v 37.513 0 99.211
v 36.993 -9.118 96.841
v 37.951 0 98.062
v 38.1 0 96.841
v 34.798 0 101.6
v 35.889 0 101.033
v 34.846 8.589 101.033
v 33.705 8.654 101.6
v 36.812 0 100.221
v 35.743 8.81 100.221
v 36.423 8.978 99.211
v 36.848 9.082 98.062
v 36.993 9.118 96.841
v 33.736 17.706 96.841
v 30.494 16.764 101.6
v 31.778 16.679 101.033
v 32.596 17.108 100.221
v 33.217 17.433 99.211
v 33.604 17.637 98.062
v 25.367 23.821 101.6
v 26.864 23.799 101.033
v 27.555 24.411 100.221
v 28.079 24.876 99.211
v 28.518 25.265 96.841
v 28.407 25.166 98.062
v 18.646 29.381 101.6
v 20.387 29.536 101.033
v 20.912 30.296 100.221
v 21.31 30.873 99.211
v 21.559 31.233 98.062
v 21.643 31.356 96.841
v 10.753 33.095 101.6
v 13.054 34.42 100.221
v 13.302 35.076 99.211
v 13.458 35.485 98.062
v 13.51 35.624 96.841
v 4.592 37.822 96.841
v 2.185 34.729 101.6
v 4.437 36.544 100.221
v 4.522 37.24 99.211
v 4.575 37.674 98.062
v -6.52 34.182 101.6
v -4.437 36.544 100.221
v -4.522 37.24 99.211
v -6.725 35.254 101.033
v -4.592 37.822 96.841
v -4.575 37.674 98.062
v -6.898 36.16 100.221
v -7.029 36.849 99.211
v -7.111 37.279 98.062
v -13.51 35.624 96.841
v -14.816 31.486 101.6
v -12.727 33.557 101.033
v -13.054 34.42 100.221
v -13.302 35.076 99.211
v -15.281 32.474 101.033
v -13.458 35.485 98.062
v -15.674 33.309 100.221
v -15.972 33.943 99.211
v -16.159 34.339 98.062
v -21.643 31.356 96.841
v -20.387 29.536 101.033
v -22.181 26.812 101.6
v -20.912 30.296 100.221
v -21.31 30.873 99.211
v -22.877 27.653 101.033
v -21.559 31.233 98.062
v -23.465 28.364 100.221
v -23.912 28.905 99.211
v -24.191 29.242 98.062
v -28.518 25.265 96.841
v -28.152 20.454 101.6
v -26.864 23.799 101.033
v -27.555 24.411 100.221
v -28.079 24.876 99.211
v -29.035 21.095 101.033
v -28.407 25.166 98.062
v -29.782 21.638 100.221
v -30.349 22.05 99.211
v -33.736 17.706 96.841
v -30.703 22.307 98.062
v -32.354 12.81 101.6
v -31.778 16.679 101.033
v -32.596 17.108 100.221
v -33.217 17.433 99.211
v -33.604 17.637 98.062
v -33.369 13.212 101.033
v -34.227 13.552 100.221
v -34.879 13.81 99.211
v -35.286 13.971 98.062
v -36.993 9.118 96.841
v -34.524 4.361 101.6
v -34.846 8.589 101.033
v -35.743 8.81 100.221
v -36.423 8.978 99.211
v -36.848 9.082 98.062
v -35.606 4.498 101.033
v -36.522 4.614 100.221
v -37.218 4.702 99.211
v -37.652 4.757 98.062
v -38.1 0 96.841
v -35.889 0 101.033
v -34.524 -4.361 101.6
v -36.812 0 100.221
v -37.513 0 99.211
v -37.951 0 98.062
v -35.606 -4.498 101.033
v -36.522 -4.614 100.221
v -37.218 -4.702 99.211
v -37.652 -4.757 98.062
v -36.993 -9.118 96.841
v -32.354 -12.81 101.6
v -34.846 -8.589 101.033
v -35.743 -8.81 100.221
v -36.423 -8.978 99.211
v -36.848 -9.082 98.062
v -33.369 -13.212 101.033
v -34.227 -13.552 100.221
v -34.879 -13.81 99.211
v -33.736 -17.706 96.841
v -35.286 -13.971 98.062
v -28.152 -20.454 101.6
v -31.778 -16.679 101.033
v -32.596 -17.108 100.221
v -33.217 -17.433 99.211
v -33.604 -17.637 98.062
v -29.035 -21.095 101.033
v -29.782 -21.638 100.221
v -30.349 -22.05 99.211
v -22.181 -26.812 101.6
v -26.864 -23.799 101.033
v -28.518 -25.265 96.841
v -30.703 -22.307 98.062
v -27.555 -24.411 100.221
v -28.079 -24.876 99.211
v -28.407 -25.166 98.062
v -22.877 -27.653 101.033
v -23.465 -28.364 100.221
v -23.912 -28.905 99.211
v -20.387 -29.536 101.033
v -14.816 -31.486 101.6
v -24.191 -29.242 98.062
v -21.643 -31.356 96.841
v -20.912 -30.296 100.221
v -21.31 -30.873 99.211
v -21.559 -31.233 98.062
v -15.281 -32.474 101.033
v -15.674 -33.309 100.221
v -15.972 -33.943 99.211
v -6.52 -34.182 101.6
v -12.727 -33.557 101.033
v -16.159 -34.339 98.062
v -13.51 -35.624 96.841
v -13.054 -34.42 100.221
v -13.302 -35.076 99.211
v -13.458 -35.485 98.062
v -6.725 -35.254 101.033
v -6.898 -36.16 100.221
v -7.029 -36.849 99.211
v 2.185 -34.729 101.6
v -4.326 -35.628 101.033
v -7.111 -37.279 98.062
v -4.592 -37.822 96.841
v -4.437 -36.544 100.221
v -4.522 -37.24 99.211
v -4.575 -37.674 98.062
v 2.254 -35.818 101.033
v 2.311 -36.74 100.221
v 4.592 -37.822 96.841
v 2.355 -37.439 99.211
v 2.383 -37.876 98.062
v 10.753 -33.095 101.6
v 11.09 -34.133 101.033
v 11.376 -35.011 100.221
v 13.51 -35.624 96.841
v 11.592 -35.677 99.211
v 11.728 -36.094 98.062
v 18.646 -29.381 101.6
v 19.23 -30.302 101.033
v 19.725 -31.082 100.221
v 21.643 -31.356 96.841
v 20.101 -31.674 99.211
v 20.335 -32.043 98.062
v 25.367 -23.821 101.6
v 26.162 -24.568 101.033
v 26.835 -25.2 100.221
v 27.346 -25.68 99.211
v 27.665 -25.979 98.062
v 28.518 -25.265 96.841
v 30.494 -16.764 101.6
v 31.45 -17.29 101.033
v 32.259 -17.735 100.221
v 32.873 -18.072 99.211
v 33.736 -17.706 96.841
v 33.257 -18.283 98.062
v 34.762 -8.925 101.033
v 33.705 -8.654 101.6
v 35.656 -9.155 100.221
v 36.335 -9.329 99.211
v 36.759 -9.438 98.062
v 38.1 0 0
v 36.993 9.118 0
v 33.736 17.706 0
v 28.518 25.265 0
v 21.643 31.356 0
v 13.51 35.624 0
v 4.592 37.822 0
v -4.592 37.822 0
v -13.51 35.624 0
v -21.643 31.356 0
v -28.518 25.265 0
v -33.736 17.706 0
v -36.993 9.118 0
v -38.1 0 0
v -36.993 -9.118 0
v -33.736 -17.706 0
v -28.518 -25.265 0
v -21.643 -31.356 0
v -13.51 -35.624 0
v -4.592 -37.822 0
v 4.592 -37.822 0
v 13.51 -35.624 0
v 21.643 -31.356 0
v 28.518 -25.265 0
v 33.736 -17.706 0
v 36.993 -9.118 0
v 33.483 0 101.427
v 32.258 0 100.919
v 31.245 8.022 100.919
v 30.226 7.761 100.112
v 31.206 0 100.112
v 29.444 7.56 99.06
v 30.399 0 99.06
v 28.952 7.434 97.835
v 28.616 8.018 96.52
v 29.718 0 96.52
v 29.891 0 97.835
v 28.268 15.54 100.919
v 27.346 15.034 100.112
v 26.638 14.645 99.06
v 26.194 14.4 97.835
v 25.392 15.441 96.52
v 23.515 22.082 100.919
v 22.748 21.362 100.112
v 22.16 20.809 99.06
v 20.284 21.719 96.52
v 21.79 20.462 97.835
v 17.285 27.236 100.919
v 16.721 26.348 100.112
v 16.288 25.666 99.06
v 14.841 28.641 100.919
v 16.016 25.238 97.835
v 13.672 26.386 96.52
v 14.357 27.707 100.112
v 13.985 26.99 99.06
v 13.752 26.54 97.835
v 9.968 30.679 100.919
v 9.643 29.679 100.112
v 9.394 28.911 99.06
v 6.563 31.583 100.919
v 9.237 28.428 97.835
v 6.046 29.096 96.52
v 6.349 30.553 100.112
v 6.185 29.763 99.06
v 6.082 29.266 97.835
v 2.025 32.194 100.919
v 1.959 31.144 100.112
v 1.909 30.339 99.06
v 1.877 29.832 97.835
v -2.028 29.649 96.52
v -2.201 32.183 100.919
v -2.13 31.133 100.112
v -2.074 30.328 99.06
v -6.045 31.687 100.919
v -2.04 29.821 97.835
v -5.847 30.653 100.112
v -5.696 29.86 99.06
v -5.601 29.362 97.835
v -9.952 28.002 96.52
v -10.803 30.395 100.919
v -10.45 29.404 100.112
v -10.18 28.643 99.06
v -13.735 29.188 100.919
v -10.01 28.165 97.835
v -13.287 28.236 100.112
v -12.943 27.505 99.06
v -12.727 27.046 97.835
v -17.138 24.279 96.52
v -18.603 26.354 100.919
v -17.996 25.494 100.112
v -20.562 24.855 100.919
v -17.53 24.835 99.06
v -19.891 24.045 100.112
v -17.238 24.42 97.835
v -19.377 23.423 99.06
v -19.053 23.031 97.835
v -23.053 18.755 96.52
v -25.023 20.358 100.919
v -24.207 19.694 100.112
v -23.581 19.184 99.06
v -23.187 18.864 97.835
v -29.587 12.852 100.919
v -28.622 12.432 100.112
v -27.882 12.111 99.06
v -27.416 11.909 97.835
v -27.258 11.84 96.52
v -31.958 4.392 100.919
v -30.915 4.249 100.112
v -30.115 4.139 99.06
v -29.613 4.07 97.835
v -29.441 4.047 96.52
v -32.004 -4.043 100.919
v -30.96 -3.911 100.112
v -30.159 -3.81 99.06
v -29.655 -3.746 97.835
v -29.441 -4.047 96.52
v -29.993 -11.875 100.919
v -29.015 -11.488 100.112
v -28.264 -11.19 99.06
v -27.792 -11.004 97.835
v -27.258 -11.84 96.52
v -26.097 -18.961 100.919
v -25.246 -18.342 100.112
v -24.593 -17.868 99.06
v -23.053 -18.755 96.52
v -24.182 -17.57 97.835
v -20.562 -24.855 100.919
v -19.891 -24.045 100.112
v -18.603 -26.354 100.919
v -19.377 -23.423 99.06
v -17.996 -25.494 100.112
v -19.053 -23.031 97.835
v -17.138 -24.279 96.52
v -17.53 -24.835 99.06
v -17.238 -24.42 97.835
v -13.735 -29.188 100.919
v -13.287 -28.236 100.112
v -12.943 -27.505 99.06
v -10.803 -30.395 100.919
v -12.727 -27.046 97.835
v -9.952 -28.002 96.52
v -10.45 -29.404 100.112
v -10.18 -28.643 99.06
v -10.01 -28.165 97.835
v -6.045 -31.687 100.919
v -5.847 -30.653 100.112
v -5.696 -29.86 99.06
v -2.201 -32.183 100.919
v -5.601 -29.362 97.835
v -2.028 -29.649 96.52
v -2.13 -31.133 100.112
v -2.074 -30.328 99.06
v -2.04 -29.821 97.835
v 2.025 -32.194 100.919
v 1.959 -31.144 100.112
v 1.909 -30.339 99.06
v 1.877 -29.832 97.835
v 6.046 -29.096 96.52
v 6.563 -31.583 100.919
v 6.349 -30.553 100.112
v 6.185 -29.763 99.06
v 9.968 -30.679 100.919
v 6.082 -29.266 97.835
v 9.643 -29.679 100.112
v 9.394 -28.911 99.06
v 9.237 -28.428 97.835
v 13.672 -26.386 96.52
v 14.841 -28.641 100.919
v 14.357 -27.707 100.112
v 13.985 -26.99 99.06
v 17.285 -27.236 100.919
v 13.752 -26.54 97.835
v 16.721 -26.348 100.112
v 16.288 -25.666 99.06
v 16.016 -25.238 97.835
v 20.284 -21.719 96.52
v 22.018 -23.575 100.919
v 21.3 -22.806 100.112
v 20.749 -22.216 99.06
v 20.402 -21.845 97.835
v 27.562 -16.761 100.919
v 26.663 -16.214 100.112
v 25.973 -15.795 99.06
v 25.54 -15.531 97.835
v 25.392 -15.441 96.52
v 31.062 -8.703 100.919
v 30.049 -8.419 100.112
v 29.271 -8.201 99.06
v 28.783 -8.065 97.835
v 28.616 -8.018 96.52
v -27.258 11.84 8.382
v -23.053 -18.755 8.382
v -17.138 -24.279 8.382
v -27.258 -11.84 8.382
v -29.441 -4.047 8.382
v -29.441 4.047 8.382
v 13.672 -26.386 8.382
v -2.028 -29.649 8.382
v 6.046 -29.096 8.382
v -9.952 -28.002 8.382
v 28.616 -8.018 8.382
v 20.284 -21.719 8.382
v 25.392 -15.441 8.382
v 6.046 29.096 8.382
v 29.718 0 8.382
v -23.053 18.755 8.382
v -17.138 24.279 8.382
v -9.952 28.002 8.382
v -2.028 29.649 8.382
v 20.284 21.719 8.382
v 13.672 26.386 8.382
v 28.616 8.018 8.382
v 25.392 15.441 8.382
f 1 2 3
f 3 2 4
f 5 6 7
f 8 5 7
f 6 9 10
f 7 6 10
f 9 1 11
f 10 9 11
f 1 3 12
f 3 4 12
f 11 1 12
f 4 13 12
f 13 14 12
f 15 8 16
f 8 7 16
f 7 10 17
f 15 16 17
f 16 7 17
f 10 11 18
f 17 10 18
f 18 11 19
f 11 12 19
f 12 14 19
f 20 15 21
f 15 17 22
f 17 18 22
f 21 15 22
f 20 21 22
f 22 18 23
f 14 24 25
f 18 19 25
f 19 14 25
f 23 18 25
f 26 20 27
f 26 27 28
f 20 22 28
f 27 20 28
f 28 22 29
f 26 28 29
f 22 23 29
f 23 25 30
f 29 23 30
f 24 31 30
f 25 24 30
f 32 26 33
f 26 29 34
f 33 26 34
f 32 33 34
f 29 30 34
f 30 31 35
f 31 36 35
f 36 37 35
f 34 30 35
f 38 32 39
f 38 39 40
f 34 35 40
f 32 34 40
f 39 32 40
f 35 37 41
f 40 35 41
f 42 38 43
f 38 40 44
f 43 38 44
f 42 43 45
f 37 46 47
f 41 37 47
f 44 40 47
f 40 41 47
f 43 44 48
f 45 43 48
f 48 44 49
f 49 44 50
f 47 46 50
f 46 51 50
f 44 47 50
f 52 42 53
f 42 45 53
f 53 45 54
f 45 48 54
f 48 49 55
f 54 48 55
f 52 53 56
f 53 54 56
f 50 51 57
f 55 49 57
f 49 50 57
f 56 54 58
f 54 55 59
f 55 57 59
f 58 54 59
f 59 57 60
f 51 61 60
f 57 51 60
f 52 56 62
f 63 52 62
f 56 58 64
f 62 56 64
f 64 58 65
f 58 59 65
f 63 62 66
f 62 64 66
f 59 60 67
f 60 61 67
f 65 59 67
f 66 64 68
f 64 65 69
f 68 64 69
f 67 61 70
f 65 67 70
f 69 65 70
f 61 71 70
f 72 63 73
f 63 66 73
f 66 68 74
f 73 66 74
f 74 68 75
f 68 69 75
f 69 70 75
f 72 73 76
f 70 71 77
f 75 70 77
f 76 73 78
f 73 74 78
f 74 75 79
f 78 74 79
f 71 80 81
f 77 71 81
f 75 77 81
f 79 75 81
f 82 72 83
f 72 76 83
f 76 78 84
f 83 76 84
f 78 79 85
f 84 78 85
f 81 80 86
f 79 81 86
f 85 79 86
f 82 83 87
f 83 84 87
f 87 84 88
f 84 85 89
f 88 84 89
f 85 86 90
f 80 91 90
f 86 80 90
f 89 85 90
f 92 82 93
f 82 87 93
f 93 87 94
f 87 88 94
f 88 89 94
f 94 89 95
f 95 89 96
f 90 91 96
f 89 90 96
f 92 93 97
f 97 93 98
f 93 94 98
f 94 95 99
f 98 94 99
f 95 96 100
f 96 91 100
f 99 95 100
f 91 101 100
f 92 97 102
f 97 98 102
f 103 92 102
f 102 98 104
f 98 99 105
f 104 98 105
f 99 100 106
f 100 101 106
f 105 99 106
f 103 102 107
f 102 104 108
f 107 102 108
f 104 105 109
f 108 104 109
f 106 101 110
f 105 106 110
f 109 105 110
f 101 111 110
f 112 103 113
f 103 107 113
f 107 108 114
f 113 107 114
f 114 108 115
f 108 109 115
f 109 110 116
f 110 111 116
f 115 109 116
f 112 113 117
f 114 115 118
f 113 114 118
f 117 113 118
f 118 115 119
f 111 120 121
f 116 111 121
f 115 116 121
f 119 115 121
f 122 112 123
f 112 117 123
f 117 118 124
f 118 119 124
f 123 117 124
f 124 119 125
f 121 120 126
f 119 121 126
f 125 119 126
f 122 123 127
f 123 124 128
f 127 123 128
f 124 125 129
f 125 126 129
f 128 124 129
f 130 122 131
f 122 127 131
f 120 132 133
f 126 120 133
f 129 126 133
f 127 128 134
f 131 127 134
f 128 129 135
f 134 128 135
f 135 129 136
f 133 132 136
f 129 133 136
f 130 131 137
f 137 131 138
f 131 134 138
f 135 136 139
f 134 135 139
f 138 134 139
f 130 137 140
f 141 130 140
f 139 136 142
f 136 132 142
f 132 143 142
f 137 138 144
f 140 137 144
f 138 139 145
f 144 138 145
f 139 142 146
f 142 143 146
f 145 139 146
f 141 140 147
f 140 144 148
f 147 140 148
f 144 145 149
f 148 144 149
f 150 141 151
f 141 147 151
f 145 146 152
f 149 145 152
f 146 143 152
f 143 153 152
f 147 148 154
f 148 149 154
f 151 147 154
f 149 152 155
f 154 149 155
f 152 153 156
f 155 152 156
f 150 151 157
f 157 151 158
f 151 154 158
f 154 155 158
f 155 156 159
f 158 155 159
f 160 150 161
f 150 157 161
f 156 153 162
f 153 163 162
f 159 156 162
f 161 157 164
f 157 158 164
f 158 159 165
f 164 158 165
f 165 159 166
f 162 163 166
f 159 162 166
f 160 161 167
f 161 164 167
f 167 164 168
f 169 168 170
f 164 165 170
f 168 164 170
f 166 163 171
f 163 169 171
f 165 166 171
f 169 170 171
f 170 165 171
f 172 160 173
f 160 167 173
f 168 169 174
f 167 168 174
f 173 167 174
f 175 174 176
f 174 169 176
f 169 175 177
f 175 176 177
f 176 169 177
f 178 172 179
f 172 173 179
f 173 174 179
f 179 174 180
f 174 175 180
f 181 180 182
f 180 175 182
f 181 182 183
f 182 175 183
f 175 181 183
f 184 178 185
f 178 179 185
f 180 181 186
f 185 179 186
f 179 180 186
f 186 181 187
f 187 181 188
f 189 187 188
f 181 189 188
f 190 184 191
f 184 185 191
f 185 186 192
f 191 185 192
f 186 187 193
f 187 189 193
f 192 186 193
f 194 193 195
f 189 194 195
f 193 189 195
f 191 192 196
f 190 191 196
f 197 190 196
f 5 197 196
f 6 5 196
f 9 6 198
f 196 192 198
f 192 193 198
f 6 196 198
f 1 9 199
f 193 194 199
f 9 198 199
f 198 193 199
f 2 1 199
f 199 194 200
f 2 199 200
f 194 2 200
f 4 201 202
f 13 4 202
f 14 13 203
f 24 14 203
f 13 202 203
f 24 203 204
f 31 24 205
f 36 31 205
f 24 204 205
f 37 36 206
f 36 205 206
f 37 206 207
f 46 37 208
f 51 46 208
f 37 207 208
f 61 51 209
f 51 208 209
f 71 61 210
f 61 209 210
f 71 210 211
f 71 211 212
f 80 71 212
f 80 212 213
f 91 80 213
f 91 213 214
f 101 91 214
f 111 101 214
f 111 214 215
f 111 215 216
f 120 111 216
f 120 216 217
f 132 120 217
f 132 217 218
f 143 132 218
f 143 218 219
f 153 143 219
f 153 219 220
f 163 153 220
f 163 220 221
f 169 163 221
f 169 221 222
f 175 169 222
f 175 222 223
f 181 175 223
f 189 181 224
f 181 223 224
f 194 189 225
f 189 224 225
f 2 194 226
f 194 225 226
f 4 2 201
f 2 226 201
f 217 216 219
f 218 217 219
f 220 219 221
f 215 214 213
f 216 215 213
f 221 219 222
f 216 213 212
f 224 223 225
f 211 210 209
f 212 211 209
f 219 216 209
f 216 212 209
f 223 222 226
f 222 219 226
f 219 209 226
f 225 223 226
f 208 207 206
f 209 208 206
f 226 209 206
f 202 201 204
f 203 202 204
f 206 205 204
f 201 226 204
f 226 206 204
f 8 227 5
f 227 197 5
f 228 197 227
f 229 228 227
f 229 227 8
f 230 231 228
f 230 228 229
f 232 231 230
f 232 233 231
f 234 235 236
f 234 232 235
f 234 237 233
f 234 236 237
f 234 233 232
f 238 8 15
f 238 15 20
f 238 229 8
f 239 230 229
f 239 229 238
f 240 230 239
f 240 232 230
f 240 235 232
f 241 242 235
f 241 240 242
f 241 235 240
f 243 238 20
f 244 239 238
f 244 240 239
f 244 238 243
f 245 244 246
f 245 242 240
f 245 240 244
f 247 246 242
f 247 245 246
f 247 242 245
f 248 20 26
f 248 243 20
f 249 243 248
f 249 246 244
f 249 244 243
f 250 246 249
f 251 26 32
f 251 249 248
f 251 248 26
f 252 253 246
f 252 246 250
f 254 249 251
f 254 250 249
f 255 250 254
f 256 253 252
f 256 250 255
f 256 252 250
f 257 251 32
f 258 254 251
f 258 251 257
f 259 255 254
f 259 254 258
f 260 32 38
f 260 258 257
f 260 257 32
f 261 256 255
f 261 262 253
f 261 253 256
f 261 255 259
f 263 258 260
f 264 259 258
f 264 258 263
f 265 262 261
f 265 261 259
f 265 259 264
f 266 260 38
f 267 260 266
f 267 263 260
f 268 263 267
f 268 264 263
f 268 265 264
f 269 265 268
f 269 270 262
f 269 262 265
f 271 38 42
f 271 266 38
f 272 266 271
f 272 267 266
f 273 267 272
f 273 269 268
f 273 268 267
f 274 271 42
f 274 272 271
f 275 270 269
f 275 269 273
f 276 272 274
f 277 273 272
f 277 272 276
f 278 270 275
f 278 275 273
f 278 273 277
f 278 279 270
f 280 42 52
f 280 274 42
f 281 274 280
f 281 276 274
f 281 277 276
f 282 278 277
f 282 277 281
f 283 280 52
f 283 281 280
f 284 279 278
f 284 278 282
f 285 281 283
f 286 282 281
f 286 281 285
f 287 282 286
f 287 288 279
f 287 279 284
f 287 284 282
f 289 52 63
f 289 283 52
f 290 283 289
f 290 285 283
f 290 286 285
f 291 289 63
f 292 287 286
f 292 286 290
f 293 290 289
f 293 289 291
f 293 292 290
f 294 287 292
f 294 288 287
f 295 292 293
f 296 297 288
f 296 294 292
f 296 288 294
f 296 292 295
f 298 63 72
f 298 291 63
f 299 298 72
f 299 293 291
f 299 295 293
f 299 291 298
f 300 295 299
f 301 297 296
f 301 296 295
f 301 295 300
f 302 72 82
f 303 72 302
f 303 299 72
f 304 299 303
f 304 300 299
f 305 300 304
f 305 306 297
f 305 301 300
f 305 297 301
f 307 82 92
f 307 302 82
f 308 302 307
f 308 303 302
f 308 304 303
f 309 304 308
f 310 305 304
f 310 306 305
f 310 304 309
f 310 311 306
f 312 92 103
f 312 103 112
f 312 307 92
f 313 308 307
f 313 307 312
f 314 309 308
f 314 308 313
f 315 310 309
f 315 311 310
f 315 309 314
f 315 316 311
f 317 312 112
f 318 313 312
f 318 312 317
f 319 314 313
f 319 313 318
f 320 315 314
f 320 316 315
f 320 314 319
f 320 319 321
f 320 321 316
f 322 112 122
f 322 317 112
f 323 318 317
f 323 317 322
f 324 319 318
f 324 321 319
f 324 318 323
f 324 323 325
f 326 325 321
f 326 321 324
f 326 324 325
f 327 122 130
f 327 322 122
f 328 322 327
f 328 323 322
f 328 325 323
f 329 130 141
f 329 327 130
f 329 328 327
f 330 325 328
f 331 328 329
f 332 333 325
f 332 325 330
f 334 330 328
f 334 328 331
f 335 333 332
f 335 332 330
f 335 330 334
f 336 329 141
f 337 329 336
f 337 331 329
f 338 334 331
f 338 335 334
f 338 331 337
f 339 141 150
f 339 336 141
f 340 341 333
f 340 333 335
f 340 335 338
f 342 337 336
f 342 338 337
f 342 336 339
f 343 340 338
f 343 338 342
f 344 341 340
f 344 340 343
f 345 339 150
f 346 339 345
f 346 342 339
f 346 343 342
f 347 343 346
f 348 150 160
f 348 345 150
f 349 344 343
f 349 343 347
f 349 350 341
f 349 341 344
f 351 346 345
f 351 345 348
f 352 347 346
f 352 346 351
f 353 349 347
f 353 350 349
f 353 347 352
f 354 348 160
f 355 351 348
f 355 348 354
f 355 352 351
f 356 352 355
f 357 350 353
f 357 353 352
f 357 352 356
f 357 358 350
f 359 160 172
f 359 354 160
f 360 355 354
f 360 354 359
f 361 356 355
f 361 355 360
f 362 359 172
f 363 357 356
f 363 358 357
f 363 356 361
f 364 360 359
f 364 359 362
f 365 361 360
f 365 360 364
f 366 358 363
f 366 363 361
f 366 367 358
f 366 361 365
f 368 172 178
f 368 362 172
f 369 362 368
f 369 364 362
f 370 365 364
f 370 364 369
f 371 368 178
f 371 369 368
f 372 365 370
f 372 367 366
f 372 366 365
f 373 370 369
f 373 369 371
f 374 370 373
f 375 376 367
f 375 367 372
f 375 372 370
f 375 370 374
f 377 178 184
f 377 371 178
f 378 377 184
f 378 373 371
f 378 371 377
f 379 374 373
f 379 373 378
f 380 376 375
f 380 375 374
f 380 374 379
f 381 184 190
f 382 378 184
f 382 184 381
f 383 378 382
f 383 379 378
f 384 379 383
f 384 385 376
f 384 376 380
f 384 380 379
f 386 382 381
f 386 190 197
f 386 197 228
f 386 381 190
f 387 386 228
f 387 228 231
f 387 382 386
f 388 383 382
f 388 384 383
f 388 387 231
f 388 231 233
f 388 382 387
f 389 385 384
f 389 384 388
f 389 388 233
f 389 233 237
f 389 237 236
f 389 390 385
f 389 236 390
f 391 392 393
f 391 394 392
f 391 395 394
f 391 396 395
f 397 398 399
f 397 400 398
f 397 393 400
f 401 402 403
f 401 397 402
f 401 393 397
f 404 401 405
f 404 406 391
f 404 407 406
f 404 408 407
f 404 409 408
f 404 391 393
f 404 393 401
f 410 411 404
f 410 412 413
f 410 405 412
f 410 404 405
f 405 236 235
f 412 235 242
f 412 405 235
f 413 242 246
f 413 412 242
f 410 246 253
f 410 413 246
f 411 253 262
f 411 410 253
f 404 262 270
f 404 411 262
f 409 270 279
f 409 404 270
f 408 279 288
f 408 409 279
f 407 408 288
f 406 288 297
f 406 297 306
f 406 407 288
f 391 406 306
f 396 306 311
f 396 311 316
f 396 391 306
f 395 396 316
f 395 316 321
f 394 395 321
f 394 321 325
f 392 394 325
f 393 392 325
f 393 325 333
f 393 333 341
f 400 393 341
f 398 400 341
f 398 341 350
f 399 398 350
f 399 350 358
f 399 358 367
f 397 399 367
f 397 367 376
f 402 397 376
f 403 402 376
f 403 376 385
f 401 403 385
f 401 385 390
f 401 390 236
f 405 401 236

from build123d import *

# Parameters (mm, degrees)
F0_R     = 38.1
F1_DEPTH = 101.6
F2_T     = -8.382
F3_R     = 5.08


# Not quite as in the source:
# - a fillet or chamfer that OpenCascade refuses, or shapes differently, is made with other operations: its cross-section is extruded or revolved along the edge and cut away or added


with BuildPart() as f1:
    # F0 (on Top) → F1 (new body)
    with BuildSketch(Plane.XY):
        Circle(F0_R)
    extrude(amount=F1_DEPTH)

    # F2
    f2_openings = [f1.faces().sort_by_distance(p)[0] for p in [
        (0, 0, 101.6),
    ]]
    offset(amount=F2_T, openings=f2_openings)

    # F3
    f3_edges = [f1.edges().sort_by_distance(p)[0] for p in [
        (-29.718, 0, 101.6),
    ]]
    fillet(f3_edges, radius=F3_R)

    # F4: fillet of radius 5.08 on 1 edges, made by hand

    # F4_s1 → F4_t2 (revolve, cut)
    with BuildSketch(Plane.XZ):
        with BuildLine():
            ThreePointArc((34.798, 101.6), (37.1936458882, 99.737357105), (38.1, 96.8413115252))
            Line((38.1, 96.8413115252), (38.1, 101.6))
            Line((38.1, 101.6), (34.798, 101.6))
        make_face()
    revolve(axis=Axis((0, 0, 101.6), (0, 0, 1)), mode=Mode.SUBTRACT)


solid = f1.part
